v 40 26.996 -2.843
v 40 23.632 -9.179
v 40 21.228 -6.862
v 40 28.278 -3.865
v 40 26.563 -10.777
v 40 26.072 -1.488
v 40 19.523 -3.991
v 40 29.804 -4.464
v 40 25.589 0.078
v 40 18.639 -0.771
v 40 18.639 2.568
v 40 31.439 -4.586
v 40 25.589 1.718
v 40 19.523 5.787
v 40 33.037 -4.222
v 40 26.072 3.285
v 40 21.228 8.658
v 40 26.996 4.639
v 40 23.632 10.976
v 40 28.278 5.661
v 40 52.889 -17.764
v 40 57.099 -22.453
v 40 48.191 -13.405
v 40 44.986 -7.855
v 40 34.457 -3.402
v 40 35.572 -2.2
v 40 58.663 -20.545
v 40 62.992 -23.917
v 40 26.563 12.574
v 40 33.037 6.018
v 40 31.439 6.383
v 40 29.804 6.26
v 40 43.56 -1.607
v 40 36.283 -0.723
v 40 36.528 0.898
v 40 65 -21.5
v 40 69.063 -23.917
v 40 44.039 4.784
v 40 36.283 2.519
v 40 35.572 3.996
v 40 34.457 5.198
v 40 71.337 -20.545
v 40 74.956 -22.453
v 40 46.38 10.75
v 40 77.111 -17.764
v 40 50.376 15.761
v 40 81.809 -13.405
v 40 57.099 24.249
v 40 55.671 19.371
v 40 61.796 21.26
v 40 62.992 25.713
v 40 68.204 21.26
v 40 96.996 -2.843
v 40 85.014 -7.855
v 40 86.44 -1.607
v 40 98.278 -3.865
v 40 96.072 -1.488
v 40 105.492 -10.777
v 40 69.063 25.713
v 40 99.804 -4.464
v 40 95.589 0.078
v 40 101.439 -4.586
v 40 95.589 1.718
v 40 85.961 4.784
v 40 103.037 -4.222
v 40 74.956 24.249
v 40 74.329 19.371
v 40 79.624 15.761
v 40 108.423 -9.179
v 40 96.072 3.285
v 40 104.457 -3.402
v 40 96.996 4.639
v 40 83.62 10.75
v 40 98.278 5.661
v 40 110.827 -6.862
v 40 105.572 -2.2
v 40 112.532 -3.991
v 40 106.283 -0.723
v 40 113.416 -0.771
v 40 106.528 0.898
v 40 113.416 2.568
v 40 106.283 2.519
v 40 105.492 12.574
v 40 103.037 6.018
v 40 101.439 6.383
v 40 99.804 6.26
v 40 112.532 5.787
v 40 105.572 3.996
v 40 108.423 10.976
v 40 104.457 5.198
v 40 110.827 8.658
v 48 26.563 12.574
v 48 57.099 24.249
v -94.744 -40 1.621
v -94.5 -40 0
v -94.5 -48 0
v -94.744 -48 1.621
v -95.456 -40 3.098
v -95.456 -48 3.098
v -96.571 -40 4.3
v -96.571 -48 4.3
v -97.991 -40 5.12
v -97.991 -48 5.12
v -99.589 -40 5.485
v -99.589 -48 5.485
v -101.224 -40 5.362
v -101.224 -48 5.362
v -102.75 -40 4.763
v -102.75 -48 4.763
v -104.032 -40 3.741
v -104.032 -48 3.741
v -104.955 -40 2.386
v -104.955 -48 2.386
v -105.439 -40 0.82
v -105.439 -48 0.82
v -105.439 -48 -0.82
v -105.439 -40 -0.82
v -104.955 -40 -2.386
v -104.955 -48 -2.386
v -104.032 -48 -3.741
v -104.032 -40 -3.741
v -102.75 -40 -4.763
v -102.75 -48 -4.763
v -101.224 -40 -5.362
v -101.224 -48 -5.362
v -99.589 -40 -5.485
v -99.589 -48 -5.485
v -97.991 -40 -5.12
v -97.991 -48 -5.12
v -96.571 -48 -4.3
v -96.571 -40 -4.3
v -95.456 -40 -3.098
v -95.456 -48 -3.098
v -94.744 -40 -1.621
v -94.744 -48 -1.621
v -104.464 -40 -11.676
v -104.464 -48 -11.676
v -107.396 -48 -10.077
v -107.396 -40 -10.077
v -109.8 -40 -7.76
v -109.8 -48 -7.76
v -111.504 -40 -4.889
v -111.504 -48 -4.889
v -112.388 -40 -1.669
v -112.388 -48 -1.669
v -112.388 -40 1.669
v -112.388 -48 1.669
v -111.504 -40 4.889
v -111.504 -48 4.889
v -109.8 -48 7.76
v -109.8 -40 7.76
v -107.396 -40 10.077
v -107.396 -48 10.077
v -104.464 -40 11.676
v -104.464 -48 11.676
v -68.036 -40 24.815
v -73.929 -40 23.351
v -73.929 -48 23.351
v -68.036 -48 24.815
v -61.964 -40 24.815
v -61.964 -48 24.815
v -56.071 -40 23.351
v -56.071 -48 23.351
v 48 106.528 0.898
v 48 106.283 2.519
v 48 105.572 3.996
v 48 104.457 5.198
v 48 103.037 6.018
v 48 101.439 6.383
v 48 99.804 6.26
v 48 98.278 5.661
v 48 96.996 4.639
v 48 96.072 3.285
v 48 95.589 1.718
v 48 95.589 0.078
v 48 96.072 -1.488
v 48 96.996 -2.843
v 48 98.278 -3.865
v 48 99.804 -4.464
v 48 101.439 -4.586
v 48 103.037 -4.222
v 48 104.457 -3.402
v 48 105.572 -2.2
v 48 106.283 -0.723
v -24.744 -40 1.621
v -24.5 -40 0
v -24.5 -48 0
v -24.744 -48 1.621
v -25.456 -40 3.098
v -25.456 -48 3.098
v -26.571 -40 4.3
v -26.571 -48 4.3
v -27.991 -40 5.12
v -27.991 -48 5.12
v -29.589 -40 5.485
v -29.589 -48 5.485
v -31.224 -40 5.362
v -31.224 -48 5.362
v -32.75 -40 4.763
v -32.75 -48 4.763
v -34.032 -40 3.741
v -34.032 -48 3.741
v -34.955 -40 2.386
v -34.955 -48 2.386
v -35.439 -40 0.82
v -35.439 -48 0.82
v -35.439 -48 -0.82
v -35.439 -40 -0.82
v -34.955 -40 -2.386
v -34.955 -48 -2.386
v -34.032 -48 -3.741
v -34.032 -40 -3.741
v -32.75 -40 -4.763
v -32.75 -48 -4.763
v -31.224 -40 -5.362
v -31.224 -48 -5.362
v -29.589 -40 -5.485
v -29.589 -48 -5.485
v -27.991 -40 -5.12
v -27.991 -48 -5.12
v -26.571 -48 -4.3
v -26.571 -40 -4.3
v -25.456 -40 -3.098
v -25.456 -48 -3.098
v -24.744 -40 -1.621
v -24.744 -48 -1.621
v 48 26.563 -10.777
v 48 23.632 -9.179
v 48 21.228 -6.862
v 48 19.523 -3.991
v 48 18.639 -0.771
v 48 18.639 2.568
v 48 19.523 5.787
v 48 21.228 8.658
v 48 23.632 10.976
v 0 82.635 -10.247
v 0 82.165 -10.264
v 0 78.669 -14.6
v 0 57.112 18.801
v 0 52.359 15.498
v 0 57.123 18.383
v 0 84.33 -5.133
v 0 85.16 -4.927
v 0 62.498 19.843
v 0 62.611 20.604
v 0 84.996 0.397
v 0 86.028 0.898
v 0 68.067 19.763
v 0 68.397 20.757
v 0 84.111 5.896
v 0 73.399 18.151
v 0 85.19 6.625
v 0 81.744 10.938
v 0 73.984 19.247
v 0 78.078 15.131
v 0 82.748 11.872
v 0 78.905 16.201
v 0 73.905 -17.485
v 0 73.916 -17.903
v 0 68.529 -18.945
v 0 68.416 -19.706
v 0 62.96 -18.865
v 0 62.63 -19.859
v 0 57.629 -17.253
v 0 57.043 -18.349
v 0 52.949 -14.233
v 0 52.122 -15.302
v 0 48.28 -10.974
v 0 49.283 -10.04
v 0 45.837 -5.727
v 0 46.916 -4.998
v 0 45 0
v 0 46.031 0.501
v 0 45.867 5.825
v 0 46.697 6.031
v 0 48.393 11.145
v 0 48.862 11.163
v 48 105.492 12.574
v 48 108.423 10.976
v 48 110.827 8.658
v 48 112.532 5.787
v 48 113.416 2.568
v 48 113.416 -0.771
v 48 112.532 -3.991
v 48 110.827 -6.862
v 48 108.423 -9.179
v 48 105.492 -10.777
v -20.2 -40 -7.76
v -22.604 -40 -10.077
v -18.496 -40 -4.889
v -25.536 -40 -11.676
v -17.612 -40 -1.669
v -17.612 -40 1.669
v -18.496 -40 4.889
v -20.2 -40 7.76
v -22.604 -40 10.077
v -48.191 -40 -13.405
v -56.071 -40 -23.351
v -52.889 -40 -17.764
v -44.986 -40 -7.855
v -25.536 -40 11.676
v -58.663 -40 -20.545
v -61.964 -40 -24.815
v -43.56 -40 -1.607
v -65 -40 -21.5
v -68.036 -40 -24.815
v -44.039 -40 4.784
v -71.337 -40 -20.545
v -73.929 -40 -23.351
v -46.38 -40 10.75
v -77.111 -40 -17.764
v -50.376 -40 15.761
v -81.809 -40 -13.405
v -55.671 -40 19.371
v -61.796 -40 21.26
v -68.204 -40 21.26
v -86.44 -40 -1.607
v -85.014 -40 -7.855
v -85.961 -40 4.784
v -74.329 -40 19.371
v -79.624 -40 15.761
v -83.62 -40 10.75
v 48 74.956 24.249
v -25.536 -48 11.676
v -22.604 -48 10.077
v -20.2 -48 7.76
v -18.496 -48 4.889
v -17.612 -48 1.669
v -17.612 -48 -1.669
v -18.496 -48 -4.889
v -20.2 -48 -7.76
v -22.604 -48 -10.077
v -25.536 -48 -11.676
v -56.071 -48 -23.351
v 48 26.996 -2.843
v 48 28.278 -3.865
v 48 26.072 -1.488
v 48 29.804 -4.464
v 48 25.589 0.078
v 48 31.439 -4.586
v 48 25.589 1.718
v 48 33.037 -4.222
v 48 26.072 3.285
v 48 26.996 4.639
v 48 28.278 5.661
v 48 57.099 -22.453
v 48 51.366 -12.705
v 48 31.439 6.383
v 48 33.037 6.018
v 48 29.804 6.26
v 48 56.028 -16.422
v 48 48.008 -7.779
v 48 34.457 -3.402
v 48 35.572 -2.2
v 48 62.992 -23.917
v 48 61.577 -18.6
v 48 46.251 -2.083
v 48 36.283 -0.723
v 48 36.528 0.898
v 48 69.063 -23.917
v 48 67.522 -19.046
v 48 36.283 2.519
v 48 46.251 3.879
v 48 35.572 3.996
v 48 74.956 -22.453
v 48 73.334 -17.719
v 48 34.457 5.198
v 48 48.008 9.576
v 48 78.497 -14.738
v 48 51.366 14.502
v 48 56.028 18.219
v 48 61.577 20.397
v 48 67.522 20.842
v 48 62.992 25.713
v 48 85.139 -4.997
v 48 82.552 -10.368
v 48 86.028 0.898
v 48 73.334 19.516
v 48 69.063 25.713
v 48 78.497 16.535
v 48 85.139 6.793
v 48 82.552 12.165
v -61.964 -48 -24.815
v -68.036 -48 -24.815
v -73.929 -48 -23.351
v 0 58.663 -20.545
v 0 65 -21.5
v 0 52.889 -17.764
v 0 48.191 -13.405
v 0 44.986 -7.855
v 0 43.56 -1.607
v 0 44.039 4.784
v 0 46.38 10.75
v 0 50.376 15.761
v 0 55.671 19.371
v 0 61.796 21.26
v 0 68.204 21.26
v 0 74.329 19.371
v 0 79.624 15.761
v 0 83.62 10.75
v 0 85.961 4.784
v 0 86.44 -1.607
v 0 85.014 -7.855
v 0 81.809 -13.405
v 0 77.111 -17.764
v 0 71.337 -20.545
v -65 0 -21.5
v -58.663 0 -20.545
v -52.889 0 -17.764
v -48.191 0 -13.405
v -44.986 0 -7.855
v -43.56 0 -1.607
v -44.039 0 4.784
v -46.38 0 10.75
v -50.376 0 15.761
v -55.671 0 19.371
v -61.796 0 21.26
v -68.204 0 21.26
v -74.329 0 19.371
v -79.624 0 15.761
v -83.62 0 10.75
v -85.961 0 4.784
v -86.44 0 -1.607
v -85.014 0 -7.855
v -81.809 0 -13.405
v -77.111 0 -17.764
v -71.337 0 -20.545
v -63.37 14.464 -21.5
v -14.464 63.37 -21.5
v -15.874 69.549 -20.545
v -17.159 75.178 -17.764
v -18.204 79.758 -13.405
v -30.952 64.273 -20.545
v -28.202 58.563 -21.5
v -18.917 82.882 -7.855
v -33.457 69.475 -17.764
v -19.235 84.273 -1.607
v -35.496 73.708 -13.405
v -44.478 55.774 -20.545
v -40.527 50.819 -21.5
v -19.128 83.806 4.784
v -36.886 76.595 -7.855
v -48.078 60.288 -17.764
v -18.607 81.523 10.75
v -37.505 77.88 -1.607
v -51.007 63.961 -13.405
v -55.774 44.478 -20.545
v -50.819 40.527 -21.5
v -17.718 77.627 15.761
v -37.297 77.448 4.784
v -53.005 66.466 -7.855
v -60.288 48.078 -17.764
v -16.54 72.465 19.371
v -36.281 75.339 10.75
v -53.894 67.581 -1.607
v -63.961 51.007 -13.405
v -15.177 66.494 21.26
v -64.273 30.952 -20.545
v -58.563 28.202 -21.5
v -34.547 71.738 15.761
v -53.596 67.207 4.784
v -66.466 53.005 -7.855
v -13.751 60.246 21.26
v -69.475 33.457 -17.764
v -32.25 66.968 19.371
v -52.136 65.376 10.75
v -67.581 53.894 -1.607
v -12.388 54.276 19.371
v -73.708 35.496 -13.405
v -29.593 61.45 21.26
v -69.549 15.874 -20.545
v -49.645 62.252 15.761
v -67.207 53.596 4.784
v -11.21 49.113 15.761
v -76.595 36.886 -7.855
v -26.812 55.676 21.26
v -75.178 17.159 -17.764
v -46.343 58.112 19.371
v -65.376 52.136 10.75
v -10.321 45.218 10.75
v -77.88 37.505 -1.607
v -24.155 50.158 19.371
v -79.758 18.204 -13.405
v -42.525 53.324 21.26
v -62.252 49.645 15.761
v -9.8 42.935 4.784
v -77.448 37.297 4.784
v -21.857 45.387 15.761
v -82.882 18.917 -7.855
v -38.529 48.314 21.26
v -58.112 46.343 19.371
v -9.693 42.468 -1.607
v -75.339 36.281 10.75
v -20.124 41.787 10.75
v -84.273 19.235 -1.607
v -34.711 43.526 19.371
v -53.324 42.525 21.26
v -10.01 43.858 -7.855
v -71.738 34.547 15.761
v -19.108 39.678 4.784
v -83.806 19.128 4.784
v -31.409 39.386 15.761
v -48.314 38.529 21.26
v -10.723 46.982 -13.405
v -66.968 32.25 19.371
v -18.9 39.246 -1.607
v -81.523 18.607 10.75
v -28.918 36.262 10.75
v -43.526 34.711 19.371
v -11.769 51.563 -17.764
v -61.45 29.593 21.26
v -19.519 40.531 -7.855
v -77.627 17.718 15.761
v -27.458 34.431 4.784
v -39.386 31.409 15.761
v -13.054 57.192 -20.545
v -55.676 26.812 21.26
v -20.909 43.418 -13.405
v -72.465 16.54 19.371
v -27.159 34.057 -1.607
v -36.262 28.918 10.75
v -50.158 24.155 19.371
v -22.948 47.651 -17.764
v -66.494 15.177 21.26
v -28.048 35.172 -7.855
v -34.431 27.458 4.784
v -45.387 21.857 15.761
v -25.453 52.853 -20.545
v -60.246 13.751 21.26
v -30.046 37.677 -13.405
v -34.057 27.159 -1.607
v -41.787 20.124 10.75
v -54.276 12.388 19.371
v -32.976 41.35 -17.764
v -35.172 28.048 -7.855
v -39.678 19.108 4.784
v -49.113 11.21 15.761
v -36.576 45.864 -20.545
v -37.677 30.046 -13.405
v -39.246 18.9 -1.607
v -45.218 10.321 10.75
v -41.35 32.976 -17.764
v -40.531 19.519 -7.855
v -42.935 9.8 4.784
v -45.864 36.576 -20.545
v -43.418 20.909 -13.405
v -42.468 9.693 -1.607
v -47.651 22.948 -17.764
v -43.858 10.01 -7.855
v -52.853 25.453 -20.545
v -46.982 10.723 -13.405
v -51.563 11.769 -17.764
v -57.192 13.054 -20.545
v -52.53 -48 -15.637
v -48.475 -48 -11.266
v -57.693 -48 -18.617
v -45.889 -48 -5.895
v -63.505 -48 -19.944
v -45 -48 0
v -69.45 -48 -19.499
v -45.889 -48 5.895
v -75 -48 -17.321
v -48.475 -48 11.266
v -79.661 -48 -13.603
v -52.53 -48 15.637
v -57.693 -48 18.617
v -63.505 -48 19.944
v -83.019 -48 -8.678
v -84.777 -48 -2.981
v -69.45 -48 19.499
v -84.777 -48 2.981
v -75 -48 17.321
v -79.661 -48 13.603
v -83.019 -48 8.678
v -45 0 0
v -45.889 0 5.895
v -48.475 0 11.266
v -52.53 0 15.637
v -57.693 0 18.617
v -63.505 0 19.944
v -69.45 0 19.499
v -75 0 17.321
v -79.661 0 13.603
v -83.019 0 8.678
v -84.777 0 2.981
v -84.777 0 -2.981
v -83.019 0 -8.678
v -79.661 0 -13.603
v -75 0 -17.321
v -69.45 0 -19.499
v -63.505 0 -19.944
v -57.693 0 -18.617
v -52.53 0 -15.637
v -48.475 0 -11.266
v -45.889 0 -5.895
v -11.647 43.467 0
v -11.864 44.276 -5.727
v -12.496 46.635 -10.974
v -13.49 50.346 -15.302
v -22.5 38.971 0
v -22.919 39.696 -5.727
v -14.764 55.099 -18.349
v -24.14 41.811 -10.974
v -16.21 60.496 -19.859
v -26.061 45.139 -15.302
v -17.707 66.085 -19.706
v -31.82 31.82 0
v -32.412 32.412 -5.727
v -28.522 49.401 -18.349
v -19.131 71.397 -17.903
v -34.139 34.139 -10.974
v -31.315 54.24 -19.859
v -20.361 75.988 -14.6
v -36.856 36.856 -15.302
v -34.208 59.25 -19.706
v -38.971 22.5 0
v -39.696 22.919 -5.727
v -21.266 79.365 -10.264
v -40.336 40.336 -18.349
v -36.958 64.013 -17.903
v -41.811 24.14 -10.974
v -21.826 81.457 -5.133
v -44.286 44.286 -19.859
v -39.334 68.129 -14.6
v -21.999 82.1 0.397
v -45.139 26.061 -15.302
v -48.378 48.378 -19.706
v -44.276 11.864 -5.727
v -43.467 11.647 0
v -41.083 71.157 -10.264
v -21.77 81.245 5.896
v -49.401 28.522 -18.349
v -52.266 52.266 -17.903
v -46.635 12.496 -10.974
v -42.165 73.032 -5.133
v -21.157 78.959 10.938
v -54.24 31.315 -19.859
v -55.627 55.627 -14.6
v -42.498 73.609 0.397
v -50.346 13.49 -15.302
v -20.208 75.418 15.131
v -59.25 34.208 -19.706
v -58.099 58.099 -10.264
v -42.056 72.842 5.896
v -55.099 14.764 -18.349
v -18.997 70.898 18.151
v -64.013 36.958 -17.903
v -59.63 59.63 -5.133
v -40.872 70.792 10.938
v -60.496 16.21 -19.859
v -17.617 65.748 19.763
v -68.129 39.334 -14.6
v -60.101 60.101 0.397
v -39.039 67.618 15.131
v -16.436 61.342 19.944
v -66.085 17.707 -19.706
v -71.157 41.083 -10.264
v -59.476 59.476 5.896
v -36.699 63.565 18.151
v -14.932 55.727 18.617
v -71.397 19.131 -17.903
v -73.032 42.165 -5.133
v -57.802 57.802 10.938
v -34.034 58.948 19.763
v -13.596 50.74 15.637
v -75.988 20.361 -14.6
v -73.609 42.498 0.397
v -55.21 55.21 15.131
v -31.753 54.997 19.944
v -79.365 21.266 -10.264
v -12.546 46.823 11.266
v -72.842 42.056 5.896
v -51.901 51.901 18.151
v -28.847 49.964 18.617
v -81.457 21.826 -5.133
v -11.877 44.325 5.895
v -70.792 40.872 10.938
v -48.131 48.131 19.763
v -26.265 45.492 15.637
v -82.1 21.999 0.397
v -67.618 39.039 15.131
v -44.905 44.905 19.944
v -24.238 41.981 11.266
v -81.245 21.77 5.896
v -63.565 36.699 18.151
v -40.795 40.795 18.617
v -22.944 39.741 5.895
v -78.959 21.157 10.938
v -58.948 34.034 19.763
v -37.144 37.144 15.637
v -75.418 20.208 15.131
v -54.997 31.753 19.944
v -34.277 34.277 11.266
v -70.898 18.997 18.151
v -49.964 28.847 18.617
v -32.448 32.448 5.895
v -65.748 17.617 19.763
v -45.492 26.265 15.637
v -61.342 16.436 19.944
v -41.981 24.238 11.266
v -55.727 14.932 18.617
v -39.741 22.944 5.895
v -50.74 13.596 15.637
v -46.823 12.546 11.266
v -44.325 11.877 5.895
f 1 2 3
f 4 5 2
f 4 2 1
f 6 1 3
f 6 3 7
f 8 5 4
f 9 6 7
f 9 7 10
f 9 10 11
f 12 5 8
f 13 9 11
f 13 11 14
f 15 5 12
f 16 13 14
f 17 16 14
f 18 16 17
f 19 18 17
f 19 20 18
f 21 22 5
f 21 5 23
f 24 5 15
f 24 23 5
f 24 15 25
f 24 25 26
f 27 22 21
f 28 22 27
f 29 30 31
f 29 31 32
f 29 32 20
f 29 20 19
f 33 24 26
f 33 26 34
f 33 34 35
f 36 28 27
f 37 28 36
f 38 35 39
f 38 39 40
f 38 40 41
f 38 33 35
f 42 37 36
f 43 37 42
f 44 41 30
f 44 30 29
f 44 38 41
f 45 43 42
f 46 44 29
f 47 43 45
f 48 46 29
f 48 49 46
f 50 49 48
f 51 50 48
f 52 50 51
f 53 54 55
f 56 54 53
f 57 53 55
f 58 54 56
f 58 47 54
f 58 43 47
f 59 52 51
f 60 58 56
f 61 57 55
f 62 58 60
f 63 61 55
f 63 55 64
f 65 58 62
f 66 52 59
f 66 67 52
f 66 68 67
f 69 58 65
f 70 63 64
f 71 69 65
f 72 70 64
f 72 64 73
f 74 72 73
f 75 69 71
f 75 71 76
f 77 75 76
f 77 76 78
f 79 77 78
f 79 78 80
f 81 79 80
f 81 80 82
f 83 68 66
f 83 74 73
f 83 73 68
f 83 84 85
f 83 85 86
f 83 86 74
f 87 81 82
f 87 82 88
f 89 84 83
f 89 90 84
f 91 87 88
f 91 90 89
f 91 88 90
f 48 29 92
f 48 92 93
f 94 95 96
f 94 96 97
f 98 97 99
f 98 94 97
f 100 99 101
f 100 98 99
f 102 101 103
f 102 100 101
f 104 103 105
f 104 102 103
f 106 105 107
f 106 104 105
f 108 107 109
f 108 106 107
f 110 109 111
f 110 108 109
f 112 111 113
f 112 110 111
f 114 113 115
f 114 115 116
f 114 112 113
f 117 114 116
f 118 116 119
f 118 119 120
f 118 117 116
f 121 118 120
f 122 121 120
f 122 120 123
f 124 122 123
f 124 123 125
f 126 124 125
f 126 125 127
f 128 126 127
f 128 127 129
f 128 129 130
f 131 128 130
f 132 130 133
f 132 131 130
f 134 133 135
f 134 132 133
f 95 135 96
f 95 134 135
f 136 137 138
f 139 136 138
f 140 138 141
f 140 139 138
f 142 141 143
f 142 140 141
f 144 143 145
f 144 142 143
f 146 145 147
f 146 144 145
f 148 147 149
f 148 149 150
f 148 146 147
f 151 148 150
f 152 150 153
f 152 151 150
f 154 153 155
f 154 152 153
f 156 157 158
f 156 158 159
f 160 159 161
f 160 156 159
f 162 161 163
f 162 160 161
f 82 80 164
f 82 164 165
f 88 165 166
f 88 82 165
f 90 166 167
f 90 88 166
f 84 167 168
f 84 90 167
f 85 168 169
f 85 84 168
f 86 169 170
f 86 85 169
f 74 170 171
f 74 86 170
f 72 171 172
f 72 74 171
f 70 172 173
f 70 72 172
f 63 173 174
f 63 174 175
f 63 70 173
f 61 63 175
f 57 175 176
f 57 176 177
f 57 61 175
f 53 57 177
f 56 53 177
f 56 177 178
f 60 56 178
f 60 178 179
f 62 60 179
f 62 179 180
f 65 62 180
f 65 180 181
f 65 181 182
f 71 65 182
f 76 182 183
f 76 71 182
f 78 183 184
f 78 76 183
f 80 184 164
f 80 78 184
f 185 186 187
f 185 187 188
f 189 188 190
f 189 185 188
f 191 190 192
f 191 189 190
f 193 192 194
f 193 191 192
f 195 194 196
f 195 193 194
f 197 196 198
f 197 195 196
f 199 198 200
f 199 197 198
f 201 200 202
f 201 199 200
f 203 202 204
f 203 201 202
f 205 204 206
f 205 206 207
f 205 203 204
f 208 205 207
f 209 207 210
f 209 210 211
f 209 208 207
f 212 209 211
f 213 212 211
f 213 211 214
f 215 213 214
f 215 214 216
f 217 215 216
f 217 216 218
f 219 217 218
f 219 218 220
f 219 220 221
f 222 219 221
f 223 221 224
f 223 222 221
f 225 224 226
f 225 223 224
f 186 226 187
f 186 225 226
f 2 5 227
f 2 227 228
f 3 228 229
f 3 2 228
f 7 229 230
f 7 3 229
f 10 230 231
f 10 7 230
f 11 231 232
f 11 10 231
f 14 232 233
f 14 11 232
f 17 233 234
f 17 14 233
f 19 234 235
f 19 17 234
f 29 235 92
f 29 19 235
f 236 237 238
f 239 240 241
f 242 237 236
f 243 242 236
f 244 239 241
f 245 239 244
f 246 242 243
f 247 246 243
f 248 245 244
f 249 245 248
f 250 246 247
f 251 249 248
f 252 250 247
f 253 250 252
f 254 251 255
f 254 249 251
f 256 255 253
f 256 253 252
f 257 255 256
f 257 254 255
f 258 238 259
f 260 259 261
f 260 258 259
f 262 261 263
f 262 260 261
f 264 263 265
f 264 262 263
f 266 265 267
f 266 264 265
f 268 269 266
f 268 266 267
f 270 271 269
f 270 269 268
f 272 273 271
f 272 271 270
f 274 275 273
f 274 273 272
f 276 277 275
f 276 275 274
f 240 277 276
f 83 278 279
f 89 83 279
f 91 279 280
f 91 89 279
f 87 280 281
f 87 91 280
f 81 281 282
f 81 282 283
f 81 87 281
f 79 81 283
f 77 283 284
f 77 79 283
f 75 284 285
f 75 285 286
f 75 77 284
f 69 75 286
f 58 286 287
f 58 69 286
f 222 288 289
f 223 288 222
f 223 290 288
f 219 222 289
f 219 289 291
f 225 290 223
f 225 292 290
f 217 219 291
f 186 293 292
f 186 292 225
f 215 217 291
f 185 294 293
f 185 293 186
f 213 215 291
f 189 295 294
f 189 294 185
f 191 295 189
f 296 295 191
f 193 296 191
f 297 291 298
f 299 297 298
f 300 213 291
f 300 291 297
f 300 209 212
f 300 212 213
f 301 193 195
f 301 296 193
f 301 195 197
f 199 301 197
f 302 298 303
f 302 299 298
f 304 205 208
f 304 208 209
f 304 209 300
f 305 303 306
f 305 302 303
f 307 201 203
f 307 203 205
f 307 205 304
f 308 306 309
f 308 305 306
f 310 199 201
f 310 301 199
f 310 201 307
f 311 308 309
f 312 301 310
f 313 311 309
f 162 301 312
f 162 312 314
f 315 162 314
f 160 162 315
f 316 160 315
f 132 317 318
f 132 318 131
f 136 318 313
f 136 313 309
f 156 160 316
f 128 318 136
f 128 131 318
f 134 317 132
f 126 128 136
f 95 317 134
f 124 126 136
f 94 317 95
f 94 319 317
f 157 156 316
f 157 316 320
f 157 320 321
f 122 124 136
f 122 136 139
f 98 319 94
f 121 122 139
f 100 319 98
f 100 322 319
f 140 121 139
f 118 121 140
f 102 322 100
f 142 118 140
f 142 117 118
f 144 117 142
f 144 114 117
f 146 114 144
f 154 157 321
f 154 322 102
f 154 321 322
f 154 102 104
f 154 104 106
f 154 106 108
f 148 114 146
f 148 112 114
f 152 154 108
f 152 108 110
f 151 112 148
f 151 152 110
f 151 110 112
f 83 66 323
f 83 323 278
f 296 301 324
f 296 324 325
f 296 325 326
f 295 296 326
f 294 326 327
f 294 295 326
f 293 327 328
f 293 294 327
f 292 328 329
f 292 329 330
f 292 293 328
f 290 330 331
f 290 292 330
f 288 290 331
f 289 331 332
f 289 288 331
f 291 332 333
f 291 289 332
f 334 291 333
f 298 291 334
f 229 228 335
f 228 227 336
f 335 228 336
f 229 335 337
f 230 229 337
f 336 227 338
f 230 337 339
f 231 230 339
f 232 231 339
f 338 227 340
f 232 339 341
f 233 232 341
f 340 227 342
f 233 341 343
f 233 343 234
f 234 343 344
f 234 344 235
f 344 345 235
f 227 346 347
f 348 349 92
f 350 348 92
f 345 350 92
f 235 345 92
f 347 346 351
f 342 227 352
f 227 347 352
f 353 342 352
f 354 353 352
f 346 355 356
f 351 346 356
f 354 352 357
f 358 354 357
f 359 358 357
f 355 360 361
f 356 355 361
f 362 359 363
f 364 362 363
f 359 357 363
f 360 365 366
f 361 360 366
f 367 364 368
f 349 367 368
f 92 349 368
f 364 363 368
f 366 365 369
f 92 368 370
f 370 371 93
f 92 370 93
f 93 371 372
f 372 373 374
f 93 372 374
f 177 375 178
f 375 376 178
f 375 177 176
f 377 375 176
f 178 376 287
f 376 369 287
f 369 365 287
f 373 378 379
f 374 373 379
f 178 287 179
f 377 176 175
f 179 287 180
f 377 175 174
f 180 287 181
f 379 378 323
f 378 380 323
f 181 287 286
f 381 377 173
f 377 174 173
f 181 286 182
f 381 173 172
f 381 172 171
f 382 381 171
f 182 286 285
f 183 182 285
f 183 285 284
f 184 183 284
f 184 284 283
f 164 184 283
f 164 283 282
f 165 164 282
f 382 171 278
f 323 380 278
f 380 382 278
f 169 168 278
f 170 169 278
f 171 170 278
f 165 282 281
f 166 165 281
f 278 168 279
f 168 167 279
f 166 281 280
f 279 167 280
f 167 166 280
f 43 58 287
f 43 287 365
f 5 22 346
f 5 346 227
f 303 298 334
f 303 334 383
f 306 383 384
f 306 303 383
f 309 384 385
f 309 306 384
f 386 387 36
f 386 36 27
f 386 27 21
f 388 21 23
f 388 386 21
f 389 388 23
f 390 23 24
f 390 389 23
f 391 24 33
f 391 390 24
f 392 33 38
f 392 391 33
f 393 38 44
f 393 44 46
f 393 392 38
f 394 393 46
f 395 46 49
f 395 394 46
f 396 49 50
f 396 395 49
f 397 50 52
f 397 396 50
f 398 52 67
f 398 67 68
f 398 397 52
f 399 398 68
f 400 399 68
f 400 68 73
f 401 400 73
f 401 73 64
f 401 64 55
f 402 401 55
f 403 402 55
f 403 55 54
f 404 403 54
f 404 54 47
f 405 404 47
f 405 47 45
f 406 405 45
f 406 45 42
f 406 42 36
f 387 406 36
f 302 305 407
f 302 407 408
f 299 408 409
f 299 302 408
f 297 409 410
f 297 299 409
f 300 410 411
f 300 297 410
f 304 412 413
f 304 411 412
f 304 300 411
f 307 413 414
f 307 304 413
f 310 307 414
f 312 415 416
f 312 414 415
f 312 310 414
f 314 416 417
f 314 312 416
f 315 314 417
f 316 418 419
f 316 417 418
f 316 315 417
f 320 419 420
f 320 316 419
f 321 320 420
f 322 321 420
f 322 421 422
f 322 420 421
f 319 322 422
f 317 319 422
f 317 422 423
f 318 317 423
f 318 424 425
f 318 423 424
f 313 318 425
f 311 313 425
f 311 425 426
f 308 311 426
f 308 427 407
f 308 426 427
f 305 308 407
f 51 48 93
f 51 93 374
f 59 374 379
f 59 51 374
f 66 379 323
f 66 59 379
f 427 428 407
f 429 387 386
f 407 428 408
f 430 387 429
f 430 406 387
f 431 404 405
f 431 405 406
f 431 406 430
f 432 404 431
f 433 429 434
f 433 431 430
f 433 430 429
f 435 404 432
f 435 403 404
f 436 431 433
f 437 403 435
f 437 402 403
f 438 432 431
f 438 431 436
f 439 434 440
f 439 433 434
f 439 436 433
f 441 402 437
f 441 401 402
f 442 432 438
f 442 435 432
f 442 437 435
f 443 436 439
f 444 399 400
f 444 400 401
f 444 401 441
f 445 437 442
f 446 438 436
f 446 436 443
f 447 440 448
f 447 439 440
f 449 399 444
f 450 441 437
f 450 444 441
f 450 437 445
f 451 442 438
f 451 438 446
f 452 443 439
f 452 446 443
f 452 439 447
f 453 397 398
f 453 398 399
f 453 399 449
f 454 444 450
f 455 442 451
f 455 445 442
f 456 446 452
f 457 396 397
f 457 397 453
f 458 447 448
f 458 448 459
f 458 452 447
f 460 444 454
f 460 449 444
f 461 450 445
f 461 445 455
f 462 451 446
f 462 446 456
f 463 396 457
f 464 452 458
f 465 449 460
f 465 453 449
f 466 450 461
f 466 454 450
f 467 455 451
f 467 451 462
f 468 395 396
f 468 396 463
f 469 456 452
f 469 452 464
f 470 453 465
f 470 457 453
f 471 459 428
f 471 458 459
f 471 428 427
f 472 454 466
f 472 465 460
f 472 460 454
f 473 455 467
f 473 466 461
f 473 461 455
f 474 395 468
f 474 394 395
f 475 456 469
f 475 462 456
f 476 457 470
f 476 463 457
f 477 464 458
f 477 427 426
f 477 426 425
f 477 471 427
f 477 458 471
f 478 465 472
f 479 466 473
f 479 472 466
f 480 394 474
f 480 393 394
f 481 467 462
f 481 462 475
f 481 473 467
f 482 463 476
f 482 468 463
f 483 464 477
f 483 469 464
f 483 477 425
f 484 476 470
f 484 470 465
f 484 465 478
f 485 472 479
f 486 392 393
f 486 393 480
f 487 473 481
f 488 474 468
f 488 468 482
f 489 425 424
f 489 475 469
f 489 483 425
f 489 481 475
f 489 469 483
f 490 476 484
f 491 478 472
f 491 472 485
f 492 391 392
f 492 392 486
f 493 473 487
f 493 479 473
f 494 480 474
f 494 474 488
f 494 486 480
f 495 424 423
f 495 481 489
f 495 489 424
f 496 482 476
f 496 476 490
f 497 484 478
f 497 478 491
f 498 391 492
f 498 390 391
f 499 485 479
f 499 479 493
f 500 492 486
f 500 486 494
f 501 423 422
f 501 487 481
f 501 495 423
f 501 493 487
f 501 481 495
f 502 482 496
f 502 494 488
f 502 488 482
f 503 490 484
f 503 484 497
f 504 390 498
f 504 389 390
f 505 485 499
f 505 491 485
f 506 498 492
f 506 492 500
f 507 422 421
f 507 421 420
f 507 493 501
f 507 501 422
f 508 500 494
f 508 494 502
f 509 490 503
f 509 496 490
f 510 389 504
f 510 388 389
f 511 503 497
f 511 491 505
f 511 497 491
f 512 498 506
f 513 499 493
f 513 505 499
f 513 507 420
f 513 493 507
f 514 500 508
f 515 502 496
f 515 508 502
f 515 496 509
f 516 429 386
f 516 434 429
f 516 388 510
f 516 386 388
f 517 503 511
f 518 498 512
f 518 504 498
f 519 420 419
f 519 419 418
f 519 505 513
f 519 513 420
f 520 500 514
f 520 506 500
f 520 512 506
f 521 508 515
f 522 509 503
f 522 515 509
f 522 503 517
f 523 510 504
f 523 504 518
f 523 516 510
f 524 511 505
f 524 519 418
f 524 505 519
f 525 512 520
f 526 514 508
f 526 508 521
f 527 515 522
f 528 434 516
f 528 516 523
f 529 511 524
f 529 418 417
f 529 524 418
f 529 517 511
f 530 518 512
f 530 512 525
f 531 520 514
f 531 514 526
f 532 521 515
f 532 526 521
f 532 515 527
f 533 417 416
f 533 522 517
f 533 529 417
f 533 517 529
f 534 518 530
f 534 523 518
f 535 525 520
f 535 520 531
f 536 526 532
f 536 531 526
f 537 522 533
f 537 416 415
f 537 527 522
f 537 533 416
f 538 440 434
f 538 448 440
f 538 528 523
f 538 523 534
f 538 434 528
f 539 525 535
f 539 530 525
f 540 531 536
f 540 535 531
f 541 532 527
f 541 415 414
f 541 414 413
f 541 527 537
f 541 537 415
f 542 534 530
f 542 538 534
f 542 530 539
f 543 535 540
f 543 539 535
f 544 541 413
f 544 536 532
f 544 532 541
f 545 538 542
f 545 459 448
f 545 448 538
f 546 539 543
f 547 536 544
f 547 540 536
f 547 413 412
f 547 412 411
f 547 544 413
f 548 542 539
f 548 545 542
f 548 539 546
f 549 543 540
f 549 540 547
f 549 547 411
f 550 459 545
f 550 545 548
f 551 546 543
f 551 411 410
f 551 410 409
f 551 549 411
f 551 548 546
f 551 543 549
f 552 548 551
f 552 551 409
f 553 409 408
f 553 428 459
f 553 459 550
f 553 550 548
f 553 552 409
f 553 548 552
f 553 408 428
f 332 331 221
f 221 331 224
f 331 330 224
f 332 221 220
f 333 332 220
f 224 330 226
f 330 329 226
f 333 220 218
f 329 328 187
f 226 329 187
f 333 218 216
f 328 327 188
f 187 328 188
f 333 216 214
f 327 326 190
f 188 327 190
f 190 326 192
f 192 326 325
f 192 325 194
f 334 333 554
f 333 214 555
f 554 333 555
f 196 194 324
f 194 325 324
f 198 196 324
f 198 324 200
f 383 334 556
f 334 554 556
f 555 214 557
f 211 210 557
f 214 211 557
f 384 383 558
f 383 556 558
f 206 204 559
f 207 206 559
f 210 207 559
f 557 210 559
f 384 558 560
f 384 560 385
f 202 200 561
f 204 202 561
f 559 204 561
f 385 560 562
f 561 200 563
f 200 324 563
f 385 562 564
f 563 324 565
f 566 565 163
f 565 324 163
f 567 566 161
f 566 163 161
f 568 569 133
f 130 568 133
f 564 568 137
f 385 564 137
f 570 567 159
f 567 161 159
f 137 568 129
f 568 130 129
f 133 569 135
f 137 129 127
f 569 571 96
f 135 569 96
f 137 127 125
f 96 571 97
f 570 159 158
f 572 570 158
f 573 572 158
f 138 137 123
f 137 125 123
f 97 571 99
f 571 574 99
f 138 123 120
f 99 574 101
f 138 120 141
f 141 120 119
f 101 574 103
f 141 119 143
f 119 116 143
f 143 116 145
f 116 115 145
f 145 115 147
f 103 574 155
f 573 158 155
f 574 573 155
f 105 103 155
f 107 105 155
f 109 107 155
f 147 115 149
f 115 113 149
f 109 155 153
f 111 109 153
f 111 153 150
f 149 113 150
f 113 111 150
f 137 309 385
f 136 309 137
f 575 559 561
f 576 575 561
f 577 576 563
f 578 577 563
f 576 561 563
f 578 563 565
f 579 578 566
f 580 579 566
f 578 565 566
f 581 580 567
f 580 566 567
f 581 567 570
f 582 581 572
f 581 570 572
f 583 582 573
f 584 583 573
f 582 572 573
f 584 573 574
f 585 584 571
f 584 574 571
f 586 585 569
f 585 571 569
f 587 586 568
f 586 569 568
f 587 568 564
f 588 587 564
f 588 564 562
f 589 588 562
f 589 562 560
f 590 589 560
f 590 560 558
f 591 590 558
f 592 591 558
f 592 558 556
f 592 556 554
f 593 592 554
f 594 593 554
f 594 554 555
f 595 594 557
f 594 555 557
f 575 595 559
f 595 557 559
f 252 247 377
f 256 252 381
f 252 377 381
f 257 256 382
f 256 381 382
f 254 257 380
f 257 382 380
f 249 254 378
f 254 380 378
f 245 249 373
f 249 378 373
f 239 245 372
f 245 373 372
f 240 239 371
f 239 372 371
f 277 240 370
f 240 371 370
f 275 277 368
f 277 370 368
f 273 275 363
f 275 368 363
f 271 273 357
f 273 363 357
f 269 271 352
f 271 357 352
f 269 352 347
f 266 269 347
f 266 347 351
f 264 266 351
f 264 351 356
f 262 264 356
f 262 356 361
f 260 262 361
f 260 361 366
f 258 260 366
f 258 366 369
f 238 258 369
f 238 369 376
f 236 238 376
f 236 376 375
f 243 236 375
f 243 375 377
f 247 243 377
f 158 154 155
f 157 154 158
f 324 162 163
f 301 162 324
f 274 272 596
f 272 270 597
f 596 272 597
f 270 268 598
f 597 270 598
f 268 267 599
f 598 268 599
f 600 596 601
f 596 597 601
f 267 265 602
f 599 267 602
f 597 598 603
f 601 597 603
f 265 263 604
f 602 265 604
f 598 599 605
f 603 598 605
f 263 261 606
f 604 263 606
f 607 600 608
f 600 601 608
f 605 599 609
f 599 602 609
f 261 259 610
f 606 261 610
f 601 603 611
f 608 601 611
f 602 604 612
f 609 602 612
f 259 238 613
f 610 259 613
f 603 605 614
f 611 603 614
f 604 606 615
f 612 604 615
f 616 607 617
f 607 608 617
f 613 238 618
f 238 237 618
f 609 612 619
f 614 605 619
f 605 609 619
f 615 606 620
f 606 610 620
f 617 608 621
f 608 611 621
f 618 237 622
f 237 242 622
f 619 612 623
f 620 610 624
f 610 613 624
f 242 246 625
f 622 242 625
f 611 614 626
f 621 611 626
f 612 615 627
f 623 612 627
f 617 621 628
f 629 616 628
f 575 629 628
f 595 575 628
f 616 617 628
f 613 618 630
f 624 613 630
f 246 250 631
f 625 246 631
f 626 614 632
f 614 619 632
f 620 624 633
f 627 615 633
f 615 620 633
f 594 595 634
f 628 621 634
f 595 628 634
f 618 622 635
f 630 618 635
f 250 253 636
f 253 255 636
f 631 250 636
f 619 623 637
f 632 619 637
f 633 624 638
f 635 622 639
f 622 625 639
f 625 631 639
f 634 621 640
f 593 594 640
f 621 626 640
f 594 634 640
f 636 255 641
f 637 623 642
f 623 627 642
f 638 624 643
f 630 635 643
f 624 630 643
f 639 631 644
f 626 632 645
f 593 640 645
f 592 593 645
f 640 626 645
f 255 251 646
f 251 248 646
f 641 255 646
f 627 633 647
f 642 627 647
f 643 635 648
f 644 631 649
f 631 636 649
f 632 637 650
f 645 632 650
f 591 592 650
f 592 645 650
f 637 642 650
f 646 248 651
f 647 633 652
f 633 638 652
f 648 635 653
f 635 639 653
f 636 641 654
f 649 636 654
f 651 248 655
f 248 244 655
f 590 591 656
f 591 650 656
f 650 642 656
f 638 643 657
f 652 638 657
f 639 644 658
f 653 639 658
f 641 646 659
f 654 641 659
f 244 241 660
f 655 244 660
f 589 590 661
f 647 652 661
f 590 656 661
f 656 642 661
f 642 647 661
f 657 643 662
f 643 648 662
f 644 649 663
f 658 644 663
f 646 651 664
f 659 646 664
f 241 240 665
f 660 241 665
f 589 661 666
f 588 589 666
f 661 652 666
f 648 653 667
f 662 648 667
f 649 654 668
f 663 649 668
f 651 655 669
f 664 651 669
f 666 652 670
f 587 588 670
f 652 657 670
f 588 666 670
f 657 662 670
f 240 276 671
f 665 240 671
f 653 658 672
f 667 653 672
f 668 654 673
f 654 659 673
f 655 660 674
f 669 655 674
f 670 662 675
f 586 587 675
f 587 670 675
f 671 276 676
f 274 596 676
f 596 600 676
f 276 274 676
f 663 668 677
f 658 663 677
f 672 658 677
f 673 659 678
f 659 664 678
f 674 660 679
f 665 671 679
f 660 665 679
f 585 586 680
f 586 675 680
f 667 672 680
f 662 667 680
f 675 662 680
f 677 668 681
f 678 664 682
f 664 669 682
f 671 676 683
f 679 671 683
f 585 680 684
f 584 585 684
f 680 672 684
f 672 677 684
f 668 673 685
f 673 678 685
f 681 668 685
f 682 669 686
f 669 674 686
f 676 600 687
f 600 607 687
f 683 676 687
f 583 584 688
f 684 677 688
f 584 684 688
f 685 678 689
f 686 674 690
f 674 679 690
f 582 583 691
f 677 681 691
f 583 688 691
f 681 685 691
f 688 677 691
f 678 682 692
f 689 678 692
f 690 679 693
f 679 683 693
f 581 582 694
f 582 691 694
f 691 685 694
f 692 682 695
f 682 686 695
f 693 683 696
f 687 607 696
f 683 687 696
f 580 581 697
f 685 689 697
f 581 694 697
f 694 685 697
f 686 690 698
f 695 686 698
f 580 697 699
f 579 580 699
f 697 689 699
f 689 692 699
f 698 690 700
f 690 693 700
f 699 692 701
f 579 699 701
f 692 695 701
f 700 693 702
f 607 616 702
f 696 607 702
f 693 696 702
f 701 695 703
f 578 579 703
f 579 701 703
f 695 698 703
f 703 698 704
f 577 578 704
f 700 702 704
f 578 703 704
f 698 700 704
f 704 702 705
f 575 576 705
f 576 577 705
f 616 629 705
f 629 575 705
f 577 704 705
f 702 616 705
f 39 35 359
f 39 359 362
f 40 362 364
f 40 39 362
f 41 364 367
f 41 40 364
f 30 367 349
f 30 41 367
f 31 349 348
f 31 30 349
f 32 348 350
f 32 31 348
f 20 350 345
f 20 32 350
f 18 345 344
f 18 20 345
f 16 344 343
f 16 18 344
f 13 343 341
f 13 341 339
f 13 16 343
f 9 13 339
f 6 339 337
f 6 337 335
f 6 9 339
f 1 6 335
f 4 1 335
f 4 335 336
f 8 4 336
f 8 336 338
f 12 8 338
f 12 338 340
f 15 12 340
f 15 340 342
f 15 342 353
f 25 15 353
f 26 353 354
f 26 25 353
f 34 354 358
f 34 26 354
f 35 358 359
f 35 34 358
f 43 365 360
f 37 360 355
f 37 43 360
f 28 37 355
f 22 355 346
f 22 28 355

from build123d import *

# Parameters (mm, degrees)
SWEEP4_PROFILE_R     = 21.5
SKETCH21_R           = 5.5
BOSS_EXTRUDE5_DEPTH  = 8
SKETCH24_R           = 5.5
SKETCH24_R_2         = 17.5
BOSS_EXTRUDE6_DEPTH  = 8
SKETCH26_R           = 20
CUT_EXTRUDE1_DEPTH   = 48
SKETCH27_R           = 20
CUT_EXTRUDE2_DEPTH   = 48
CUT_SWEEP1_PROFILE_R = 20


with BuildPart() as part:
    # Sweep4: sweep along a path in Sketch1
    with BuildLine(Plane.XY) as sweep4_path:
        Line((40, 65), (0, 65))
        ThreePointArc((0, 65), (-45.961940777, 45.961940777), (-65, 0))
        Line((-65, 0), (-65, -40))
    # Sweep4 profile (on start of the path) → Sweep4 (sweep)
    with BuildSketch(Plane(origin=(40, 65, 0), x_dir=(0, 0, -1), z_dir=(-1, 0, 0))):
        Circle(SWEEP4_PROFILE_R)
    sweep(path=sweep4_path.line)

    # Sketch21 → Boss-Extrude5 (add)
    with BuildSketch(Plane.XZ.offset(40)):
        with BuildLine():
            Line((-104.464285714, 11.67562217), (-73.928571429, 23.35124434))
            ThreePointArc((-73.928571429, 23.35124434), (-65, 25), (-56.071428571, 23.35124434))
            Line((-56.071428571, 23.35124434), (-25.535714286, 11.67562217))
            ThreePointArc((-25.535714286, 11.67562217), (-17.5, 0), (-25.535714286, -11.67562217))
            Line((-25.535714286, -11.67562217), (-56.071428571, -23.35124434))
            ThreePointArc((-56.071428571, -23.35124434), (-65, -25), (-73.928571429, -23.35124434))
            Line((-73.928571429, -23.35124434), (-104.464285714, -11.67562217))
            ThreePointArc((-104.464285714, -11.67562217), (-112.5, 0), (-104.464285714, 11.67562217))
        make_face()
        with Locations((-100, 0)):
            Circle(SKETCH21_R, mode=Mode.SUBTRACT)
        with Locations((-30, 0)):
            Circle(SKETCH21_R, mode=Mode.SUBTRACT)
    extrude(amount=BOSS_EXTRUDE5_DEPTH)

    # Sketch24 → Boss-Extrude6 (add)
    with BuildSketch(Plane(origin=(40, 0, 0), x_dir=(0, 0, -1), z_dir=(1, 0, 0))):
        with BuildLine():
            Line((-12.573810861, 26.563231974), (-24.249433031, 57.09894626))
            ThreePointArc((-24.249433031, 57.09894626), (-25.898188691, 66.027517688), (-24.249433031, 74.956089117))
            Line((-24.249433031, 74.956089117), (-12.573810861, 105.491803403))
            ThreePointArc((-12.573810861, 105.491803403), (-0.898188691, 113.527517688), (10.77743348, 105.491803403))
            Line((10.77743348, 105.491803403), (22.45305565, 74.956089117))
            ThreePointArc((22.45305565, 74.956089117), (24.101811309, 66.027517688), (22.45305565, 57.09894626))
            Line((22.45305565, 57.09894626), (10.77743348, 26.563231974))
            ThreePointArc((10.77743348, 26.563231974), (-0.898188691, 18.527517688), (-12.573810861, 26.563231974))
        make_face()
        with Locations(Location((-0.898188691, 31.027517688, 0), (0, 0, 90))):
            Circle(SKETCH24_R, mode=Mode.SUBTRACT)
        with Locations((-0.898188691, 66.027517688)):
            Circle(SKETCH24_R_2, mode=Mode.SUBTRACT)
        with Locations(Location((-0.898188691, 101.027517688, 0), (0, 0, 90))):
            Circle(SKETCH24_R, mode=Mode.SUBTRACT)
    extrude(amount=BOSS_EXTRUDE6_DEPTH)

    # Sketch26 → Cut-Extrude1 (cut)
    with BuildSketch(Plane.XZ.offset(48)):
        with Locations((-65, 0)):
            Circle(SKETCH26_R)
    extrude(amount=-CUT_EXTRUDE1_DEPTH, mode=Mode.SUBTRACT)

    # Sketch27 → Cut-Extrude2 (cut)
    with BuildSketch(Plane(origin=(48, 0, 0), x_dir=(0, 0, -1), z_dir=(1, 0, 0))):
        with Locations(Location((-0.898188691, 66.027517688, 0), (0, 0, 90))):
            Circle(SKETCH27_R)
    extrude(amount=-CUT_EXTRUDE2_DEPTH, mode=Mode.SUBTRACT)

    # Cut-Sweep1: sweep along a path in Sketch28
    with BuildLine(Plane.XY) as cut_sweep1_path:
        ThreePointArc((0, 65), (-45.961940777, 45.961940777), (-65, 0))
    # Cut-Sweep1 profile (on start of the path) → Cut-Sweep1 (sweep, cut)
    with BuildSketch(Plane(origin=(0, 65, 0), x_dir=(0, -1, 0), z_dir=(-1, 0, 0))):
        Circle(CUT_SWEEP1_PROFILE_R)
    sweep(path=cut_sweep1_path.line, mode=Mode.SUBTRACT)


solid = part.part
